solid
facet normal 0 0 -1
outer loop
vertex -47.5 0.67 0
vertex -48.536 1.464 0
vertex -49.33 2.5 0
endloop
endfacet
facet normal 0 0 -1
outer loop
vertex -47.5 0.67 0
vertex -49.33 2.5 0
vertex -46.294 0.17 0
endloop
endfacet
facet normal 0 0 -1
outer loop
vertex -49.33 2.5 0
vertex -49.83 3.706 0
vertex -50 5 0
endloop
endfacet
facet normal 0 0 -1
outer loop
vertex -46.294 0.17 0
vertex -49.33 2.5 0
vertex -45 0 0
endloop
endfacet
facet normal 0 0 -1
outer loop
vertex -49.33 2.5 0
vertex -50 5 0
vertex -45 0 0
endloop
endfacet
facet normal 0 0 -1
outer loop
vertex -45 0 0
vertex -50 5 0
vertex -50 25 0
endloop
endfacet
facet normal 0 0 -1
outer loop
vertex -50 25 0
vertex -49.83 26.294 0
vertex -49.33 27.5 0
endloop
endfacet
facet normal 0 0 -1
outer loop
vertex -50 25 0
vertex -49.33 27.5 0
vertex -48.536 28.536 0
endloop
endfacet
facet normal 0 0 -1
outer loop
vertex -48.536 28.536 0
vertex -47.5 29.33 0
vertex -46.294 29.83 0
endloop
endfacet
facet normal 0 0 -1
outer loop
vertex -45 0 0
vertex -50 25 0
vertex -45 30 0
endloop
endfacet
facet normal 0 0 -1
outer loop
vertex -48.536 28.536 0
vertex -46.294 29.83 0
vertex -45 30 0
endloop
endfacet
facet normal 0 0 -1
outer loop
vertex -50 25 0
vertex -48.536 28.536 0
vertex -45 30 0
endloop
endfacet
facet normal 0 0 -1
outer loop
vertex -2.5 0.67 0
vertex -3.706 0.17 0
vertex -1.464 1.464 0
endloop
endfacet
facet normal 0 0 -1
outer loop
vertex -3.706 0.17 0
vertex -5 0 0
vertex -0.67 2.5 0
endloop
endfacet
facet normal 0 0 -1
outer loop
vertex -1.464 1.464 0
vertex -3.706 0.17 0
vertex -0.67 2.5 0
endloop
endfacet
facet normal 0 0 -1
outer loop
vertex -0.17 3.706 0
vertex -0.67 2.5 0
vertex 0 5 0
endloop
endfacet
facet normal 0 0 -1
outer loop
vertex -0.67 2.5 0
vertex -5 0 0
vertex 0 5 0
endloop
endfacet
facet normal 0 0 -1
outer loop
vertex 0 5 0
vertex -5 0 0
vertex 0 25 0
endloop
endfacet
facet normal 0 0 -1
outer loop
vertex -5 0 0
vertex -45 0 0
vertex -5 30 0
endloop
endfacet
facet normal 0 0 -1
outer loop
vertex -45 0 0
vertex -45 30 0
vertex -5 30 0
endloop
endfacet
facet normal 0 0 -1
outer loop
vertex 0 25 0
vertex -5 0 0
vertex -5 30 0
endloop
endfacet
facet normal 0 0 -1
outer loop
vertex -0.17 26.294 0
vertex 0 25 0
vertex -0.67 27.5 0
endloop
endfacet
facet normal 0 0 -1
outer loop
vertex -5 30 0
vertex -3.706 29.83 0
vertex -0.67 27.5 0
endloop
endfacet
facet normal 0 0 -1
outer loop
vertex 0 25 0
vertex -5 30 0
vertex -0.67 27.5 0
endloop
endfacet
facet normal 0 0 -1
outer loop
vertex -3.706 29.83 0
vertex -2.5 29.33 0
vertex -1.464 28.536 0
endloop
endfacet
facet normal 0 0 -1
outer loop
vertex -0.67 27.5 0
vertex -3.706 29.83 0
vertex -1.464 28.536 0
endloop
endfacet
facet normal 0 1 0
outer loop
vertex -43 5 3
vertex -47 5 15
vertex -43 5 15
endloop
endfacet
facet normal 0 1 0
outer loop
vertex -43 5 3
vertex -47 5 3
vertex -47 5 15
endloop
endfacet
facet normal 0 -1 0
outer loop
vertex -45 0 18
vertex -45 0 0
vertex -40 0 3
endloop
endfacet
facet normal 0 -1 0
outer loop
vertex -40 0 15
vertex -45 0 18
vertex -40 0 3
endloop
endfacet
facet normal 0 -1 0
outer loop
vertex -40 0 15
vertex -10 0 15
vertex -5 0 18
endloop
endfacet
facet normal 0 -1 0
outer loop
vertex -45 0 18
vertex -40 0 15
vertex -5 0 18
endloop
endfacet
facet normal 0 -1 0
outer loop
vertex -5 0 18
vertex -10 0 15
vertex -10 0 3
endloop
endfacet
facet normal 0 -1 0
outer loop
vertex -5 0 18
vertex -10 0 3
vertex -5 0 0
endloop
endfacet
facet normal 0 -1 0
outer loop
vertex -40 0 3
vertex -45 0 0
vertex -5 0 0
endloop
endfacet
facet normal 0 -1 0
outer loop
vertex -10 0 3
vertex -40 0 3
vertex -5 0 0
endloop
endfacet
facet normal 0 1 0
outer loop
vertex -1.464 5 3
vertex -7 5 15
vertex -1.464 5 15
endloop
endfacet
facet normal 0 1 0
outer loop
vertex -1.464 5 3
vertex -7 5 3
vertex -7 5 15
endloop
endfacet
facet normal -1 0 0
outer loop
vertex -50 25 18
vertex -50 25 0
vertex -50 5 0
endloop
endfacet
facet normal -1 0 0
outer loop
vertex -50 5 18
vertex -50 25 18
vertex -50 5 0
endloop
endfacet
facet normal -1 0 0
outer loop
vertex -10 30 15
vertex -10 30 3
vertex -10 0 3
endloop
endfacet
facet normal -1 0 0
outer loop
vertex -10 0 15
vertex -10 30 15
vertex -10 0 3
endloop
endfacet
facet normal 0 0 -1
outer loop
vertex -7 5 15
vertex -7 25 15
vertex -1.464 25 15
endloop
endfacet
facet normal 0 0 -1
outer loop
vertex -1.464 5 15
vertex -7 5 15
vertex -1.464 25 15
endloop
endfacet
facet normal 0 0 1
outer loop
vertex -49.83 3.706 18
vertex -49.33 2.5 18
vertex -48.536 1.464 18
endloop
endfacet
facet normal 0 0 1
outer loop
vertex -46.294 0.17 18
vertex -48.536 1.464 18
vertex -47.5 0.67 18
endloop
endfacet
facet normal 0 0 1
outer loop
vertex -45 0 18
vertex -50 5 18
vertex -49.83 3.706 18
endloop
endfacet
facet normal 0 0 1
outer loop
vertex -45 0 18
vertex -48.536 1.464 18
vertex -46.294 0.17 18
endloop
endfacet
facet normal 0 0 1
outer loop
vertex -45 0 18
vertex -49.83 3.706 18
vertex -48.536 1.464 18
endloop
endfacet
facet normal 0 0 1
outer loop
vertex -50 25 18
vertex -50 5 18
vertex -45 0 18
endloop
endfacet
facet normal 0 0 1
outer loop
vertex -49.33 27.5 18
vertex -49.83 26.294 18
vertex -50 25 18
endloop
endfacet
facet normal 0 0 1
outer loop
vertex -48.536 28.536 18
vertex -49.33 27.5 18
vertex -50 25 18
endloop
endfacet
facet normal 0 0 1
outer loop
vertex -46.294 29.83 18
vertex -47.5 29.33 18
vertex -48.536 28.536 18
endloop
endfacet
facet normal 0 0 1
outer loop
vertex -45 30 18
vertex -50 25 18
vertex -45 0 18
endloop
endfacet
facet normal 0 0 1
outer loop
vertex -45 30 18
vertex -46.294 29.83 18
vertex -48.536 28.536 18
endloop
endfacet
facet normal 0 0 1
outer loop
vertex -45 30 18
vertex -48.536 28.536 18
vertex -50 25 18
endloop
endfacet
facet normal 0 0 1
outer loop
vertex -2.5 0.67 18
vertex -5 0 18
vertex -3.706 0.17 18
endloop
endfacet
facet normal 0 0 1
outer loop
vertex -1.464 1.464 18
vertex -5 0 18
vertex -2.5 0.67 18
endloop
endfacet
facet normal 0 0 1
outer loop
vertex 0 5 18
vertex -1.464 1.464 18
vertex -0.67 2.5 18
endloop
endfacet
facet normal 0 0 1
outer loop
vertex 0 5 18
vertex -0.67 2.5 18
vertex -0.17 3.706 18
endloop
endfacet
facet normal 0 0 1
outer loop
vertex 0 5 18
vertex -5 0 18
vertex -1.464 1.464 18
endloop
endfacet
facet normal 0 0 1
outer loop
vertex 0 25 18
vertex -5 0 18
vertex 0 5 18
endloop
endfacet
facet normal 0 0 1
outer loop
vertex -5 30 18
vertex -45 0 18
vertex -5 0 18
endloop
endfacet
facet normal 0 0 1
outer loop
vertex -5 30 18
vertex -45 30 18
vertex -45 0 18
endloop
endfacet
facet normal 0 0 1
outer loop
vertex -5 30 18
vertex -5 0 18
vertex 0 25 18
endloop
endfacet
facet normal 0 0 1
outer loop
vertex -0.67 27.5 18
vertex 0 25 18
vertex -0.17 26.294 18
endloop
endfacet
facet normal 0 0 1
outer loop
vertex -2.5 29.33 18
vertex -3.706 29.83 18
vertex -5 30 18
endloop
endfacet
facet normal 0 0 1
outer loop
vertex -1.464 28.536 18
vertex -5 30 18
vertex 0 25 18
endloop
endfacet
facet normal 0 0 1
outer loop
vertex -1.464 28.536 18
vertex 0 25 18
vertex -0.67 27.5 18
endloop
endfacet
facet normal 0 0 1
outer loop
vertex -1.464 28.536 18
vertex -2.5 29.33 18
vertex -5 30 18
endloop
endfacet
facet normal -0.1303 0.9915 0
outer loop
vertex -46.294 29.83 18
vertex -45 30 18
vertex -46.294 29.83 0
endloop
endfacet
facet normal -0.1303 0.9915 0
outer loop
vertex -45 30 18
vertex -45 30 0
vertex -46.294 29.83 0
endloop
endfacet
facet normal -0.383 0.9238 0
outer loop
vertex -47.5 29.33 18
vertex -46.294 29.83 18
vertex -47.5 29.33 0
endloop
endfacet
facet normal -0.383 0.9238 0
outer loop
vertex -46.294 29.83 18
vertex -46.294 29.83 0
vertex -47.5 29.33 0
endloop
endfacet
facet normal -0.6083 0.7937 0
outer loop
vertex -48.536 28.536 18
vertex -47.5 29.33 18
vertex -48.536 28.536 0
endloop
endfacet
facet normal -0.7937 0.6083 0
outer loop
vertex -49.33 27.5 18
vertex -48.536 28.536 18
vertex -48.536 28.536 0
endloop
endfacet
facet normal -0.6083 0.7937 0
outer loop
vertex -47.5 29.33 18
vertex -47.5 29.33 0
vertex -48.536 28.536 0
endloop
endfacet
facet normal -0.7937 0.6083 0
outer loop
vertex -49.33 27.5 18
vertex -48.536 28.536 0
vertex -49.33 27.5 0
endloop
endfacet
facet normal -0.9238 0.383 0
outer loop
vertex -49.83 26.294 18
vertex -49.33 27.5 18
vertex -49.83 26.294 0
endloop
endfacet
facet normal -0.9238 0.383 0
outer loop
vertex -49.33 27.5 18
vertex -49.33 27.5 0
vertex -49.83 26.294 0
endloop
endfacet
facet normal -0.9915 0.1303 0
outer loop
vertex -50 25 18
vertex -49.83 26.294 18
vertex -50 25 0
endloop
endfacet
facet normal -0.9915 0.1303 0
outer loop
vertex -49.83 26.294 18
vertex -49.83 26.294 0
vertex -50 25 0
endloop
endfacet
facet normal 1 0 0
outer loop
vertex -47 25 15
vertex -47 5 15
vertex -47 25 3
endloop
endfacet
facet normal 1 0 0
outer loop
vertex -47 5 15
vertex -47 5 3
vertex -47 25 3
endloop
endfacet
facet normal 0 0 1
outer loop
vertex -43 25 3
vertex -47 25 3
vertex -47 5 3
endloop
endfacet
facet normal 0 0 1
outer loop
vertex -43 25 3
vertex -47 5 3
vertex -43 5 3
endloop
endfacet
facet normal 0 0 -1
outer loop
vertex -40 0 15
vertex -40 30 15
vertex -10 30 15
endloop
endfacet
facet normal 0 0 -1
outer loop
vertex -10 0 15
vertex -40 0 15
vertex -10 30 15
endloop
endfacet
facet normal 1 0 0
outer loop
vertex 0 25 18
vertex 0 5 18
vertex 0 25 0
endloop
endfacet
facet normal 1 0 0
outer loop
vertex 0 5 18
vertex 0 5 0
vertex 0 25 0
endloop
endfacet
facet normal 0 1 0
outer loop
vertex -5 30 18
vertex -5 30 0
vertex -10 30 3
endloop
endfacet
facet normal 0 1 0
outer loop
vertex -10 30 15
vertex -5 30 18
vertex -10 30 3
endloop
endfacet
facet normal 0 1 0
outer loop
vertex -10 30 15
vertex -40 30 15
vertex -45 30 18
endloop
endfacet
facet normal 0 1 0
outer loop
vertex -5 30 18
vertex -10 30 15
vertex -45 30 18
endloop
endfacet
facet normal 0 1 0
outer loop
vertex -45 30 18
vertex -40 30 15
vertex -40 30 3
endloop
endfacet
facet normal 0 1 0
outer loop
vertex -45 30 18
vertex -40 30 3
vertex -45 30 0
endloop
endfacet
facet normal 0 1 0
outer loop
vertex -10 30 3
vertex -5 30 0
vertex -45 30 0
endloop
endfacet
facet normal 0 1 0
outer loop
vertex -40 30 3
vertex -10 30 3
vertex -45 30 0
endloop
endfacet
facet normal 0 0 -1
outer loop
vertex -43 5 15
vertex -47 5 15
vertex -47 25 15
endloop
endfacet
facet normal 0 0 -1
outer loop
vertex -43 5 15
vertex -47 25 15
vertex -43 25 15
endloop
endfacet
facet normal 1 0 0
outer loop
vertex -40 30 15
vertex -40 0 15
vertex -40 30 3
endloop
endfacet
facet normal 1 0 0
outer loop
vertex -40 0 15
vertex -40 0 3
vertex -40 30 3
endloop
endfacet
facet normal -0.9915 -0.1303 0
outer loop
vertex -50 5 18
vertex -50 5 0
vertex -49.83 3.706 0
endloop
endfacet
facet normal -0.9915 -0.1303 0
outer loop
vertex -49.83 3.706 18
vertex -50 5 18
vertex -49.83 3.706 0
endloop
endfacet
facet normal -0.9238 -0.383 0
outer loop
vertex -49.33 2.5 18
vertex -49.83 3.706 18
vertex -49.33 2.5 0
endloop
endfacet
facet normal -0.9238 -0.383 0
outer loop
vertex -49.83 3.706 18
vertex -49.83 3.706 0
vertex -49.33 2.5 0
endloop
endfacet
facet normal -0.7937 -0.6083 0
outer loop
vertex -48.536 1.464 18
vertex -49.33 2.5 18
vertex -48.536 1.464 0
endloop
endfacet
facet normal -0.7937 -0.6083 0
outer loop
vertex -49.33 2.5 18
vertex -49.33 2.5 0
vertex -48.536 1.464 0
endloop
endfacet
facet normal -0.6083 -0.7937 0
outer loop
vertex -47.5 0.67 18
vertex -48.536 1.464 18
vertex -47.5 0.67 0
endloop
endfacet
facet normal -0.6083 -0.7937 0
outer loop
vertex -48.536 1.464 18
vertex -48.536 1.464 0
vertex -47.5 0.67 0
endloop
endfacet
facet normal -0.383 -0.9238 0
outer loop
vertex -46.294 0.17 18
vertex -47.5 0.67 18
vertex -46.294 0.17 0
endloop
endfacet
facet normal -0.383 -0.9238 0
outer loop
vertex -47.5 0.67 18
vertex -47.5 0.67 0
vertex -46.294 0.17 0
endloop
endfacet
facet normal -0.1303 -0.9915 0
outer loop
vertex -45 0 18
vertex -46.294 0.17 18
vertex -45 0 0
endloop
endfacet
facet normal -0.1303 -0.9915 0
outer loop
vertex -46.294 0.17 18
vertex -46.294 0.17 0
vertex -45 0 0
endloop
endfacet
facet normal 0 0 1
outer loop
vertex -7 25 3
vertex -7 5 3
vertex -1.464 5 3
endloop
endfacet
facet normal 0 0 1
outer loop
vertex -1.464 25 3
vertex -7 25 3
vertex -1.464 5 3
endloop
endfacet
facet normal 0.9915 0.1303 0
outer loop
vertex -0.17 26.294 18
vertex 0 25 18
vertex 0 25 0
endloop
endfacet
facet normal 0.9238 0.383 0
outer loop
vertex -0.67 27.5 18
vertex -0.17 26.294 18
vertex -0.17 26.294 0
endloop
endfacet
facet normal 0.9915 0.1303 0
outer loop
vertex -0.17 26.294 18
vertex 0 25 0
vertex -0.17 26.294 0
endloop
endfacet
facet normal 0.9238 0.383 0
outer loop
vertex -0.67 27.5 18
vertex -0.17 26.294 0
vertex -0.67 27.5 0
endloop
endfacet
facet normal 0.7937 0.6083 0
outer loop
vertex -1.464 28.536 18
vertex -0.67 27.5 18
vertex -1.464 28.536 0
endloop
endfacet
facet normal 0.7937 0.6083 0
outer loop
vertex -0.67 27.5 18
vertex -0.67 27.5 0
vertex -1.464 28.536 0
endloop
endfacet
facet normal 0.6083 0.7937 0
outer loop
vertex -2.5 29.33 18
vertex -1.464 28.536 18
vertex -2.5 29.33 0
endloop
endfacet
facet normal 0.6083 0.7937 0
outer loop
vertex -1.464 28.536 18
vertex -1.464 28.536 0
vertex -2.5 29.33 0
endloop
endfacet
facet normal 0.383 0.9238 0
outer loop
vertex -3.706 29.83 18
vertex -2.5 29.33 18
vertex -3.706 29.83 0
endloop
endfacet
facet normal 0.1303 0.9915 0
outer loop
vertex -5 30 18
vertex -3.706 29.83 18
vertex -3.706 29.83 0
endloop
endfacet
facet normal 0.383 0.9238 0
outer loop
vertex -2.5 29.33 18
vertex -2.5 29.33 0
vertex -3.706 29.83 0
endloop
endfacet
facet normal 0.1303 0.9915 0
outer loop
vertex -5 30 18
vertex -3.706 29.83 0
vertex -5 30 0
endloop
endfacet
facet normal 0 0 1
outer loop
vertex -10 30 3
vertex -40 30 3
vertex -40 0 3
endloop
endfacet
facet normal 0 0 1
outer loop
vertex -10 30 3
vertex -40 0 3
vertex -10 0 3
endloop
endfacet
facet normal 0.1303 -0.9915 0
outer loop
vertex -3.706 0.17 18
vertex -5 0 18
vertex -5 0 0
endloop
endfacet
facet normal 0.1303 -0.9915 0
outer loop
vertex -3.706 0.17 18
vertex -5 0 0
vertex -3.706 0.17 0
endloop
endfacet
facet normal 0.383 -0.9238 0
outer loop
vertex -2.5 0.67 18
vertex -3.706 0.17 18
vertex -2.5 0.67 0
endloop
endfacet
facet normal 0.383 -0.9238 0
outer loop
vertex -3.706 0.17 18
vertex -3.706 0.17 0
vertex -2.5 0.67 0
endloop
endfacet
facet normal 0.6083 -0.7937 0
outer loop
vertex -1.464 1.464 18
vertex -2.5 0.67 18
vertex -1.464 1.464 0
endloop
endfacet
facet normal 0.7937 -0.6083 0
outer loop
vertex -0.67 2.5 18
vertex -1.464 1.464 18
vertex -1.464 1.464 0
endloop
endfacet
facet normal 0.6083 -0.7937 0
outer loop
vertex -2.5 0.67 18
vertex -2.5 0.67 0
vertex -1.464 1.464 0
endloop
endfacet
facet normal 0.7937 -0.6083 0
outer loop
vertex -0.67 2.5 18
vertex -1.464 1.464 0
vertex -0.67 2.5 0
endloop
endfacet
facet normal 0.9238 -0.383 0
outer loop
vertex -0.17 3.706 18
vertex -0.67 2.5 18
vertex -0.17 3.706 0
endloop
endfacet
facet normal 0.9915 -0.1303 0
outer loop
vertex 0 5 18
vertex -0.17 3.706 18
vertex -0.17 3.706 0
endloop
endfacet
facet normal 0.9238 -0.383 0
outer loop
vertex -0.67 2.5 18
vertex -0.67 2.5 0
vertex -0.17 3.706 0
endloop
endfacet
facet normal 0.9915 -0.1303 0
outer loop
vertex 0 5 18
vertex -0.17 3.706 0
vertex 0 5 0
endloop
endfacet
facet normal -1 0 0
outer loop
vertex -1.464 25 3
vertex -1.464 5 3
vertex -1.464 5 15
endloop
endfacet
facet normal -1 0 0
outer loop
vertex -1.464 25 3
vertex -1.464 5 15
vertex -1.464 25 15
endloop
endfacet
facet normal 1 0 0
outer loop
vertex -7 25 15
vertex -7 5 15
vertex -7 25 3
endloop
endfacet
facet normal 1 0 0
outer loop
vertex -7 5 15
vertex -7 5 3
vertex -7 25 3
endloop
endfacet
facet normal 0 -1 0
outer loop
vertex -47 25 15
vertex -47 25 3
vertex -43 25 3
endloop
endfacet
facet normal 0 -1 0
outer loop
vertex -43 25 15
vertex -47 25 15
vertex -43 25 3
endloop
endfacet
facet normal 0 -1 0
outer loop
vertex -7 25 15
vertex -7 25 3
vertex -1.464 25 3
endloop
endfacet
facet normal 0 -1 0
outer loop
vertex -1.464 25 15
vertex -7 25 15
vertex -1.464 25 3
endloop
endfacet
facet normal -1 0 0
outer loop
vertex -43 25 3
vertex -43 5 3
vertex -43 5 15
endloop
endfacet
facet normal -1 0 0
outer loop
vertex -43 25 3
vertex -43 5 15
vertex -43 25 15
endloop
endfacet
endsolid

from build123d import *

# Parameters (mm, degrees)
F1_DEPTH = 3
F2_W     = 4
F2_H     = 20
F2_W_2   = 5.5355339059
F3_DEPTH = 7
F4_DEPTH = 5
F5_W     = 4
F5_H     = 20
F6_DEPTH = 3


with BuildPart() as f1:
    # F0 (on Top) → F1 (new body)
    with BuildSketch(Plane.XY):
        with BuildLine():
            Line((-45, 0), (-5, 0))
            ThreePointArc((-5, 0), (-1.4644660941, 1.4644660941), (0, 5))
            Line((0, 5), (0, 25))
            ThreePointArc((0, 25), (-1.4644660941, 28.5355339059), (-5, 30))
            Line((-5, 30), (-45, 30))
            ThreePointArc((-45, 30), (-48.5355339059, 28.5355339059), (-50, 25))
            Line((-50, 25), (-50, 5))
            ThreePointArc((-50, 5), (-48.5355339059, 1.4644660941), (-45, 0))
        make_face()
    extrude(amount=F1_DEPTH)

    # F2 (on face) → F3 (join)
    with BuildSketch(Plane.XY.offset(3)):
        with BuildLine():
            Line((-45, 0), (-40, 0))
            Line((-40, 0), (-40, 30))
            Line((-40, 30), (-45, 30))
            ThreePointArc((-45, 30), (-48.5355339059, 28.5355339059), (-50, 25))
            Line((-50, 25), (-50, 5))
            ThreePointArc((-50, 5), (-48.5355339059, 1.4644660941), (-45, 0))
        make_face()
        with Locations((-45, 15)):
            Rectangle(F2_W, F2_H, mode=Mode.SUBTRACT)
        with BuildLine():
            Line((-10, 0), (-5, 0))
            ThreePointArc((-5, 0), (-1.4644660941, 1.4644660941), (0, 5))
            Line((0, 5), (0, 25))
            ThreePointArc((0, 25), (-1.4644660941, 28.5355339059), (-5, 30))
            Line((-5, 30), (-10, 30))
            Line((-10, 30), (-10, 0))
        make_face()
        with Locations((-4.232233047, 15)):
            Rectangle(F2_W_2, F2_H, mode=Mode.SUBTRACT)
    extrude(amount=F3_DEPTH)

    # F4 (add): faces of the model
    f4_faces = [f1.faces().sort_by_distance(p)[0] for p in [
        (-42.5, 0.316227766, 10),
        (-7.5, 0.316227766, 10),
    ]]
    extrude(f4_faces, amount=F4_DEPTH)

    # F5 (on face) → F6 (join)
    with BuildSketch(Plane.XY.offset(15)):
        with BuildLine():
            Line((-45, 0), (-40, 0))
            Line((-40, 0), (-40, 30))
            Line((-40, 30), (-45, 30))
            ThreePointArc((-45, 30), (-48.5355339059, 28.5355339059), (-50, 25))
            Line((-50, 25), (-50, 5))
            ThreePointArc((-50, 5), (-48.5355339059, 1.4644660941), (-45, 0))
        make_face()
        with Locations((-45, 15)):
            Rectangle(F5_W, F5_H, mode=Mode.SUBTRACT)
        with BuildLine():
            Line((-40, 0), (-5, 0))
            ThreePointArc((-5, 0), (-1.4644660941, 1.4644660941), (0, 5))
            Line((0, 5), (0, 25))
            ThreePointArc((0, 25), (-1.4644660941, 28.5355339059), (-5, 30))
            Line((-5, 30), (-40, 30))
            Line((-40, 30), (-40, 0))
        make_face()
        with Locations((-45, 15)):
            Rectangle(F5_W, F5_H)
    extrude(amount=F6_DEPTH)


solid = f1.part
